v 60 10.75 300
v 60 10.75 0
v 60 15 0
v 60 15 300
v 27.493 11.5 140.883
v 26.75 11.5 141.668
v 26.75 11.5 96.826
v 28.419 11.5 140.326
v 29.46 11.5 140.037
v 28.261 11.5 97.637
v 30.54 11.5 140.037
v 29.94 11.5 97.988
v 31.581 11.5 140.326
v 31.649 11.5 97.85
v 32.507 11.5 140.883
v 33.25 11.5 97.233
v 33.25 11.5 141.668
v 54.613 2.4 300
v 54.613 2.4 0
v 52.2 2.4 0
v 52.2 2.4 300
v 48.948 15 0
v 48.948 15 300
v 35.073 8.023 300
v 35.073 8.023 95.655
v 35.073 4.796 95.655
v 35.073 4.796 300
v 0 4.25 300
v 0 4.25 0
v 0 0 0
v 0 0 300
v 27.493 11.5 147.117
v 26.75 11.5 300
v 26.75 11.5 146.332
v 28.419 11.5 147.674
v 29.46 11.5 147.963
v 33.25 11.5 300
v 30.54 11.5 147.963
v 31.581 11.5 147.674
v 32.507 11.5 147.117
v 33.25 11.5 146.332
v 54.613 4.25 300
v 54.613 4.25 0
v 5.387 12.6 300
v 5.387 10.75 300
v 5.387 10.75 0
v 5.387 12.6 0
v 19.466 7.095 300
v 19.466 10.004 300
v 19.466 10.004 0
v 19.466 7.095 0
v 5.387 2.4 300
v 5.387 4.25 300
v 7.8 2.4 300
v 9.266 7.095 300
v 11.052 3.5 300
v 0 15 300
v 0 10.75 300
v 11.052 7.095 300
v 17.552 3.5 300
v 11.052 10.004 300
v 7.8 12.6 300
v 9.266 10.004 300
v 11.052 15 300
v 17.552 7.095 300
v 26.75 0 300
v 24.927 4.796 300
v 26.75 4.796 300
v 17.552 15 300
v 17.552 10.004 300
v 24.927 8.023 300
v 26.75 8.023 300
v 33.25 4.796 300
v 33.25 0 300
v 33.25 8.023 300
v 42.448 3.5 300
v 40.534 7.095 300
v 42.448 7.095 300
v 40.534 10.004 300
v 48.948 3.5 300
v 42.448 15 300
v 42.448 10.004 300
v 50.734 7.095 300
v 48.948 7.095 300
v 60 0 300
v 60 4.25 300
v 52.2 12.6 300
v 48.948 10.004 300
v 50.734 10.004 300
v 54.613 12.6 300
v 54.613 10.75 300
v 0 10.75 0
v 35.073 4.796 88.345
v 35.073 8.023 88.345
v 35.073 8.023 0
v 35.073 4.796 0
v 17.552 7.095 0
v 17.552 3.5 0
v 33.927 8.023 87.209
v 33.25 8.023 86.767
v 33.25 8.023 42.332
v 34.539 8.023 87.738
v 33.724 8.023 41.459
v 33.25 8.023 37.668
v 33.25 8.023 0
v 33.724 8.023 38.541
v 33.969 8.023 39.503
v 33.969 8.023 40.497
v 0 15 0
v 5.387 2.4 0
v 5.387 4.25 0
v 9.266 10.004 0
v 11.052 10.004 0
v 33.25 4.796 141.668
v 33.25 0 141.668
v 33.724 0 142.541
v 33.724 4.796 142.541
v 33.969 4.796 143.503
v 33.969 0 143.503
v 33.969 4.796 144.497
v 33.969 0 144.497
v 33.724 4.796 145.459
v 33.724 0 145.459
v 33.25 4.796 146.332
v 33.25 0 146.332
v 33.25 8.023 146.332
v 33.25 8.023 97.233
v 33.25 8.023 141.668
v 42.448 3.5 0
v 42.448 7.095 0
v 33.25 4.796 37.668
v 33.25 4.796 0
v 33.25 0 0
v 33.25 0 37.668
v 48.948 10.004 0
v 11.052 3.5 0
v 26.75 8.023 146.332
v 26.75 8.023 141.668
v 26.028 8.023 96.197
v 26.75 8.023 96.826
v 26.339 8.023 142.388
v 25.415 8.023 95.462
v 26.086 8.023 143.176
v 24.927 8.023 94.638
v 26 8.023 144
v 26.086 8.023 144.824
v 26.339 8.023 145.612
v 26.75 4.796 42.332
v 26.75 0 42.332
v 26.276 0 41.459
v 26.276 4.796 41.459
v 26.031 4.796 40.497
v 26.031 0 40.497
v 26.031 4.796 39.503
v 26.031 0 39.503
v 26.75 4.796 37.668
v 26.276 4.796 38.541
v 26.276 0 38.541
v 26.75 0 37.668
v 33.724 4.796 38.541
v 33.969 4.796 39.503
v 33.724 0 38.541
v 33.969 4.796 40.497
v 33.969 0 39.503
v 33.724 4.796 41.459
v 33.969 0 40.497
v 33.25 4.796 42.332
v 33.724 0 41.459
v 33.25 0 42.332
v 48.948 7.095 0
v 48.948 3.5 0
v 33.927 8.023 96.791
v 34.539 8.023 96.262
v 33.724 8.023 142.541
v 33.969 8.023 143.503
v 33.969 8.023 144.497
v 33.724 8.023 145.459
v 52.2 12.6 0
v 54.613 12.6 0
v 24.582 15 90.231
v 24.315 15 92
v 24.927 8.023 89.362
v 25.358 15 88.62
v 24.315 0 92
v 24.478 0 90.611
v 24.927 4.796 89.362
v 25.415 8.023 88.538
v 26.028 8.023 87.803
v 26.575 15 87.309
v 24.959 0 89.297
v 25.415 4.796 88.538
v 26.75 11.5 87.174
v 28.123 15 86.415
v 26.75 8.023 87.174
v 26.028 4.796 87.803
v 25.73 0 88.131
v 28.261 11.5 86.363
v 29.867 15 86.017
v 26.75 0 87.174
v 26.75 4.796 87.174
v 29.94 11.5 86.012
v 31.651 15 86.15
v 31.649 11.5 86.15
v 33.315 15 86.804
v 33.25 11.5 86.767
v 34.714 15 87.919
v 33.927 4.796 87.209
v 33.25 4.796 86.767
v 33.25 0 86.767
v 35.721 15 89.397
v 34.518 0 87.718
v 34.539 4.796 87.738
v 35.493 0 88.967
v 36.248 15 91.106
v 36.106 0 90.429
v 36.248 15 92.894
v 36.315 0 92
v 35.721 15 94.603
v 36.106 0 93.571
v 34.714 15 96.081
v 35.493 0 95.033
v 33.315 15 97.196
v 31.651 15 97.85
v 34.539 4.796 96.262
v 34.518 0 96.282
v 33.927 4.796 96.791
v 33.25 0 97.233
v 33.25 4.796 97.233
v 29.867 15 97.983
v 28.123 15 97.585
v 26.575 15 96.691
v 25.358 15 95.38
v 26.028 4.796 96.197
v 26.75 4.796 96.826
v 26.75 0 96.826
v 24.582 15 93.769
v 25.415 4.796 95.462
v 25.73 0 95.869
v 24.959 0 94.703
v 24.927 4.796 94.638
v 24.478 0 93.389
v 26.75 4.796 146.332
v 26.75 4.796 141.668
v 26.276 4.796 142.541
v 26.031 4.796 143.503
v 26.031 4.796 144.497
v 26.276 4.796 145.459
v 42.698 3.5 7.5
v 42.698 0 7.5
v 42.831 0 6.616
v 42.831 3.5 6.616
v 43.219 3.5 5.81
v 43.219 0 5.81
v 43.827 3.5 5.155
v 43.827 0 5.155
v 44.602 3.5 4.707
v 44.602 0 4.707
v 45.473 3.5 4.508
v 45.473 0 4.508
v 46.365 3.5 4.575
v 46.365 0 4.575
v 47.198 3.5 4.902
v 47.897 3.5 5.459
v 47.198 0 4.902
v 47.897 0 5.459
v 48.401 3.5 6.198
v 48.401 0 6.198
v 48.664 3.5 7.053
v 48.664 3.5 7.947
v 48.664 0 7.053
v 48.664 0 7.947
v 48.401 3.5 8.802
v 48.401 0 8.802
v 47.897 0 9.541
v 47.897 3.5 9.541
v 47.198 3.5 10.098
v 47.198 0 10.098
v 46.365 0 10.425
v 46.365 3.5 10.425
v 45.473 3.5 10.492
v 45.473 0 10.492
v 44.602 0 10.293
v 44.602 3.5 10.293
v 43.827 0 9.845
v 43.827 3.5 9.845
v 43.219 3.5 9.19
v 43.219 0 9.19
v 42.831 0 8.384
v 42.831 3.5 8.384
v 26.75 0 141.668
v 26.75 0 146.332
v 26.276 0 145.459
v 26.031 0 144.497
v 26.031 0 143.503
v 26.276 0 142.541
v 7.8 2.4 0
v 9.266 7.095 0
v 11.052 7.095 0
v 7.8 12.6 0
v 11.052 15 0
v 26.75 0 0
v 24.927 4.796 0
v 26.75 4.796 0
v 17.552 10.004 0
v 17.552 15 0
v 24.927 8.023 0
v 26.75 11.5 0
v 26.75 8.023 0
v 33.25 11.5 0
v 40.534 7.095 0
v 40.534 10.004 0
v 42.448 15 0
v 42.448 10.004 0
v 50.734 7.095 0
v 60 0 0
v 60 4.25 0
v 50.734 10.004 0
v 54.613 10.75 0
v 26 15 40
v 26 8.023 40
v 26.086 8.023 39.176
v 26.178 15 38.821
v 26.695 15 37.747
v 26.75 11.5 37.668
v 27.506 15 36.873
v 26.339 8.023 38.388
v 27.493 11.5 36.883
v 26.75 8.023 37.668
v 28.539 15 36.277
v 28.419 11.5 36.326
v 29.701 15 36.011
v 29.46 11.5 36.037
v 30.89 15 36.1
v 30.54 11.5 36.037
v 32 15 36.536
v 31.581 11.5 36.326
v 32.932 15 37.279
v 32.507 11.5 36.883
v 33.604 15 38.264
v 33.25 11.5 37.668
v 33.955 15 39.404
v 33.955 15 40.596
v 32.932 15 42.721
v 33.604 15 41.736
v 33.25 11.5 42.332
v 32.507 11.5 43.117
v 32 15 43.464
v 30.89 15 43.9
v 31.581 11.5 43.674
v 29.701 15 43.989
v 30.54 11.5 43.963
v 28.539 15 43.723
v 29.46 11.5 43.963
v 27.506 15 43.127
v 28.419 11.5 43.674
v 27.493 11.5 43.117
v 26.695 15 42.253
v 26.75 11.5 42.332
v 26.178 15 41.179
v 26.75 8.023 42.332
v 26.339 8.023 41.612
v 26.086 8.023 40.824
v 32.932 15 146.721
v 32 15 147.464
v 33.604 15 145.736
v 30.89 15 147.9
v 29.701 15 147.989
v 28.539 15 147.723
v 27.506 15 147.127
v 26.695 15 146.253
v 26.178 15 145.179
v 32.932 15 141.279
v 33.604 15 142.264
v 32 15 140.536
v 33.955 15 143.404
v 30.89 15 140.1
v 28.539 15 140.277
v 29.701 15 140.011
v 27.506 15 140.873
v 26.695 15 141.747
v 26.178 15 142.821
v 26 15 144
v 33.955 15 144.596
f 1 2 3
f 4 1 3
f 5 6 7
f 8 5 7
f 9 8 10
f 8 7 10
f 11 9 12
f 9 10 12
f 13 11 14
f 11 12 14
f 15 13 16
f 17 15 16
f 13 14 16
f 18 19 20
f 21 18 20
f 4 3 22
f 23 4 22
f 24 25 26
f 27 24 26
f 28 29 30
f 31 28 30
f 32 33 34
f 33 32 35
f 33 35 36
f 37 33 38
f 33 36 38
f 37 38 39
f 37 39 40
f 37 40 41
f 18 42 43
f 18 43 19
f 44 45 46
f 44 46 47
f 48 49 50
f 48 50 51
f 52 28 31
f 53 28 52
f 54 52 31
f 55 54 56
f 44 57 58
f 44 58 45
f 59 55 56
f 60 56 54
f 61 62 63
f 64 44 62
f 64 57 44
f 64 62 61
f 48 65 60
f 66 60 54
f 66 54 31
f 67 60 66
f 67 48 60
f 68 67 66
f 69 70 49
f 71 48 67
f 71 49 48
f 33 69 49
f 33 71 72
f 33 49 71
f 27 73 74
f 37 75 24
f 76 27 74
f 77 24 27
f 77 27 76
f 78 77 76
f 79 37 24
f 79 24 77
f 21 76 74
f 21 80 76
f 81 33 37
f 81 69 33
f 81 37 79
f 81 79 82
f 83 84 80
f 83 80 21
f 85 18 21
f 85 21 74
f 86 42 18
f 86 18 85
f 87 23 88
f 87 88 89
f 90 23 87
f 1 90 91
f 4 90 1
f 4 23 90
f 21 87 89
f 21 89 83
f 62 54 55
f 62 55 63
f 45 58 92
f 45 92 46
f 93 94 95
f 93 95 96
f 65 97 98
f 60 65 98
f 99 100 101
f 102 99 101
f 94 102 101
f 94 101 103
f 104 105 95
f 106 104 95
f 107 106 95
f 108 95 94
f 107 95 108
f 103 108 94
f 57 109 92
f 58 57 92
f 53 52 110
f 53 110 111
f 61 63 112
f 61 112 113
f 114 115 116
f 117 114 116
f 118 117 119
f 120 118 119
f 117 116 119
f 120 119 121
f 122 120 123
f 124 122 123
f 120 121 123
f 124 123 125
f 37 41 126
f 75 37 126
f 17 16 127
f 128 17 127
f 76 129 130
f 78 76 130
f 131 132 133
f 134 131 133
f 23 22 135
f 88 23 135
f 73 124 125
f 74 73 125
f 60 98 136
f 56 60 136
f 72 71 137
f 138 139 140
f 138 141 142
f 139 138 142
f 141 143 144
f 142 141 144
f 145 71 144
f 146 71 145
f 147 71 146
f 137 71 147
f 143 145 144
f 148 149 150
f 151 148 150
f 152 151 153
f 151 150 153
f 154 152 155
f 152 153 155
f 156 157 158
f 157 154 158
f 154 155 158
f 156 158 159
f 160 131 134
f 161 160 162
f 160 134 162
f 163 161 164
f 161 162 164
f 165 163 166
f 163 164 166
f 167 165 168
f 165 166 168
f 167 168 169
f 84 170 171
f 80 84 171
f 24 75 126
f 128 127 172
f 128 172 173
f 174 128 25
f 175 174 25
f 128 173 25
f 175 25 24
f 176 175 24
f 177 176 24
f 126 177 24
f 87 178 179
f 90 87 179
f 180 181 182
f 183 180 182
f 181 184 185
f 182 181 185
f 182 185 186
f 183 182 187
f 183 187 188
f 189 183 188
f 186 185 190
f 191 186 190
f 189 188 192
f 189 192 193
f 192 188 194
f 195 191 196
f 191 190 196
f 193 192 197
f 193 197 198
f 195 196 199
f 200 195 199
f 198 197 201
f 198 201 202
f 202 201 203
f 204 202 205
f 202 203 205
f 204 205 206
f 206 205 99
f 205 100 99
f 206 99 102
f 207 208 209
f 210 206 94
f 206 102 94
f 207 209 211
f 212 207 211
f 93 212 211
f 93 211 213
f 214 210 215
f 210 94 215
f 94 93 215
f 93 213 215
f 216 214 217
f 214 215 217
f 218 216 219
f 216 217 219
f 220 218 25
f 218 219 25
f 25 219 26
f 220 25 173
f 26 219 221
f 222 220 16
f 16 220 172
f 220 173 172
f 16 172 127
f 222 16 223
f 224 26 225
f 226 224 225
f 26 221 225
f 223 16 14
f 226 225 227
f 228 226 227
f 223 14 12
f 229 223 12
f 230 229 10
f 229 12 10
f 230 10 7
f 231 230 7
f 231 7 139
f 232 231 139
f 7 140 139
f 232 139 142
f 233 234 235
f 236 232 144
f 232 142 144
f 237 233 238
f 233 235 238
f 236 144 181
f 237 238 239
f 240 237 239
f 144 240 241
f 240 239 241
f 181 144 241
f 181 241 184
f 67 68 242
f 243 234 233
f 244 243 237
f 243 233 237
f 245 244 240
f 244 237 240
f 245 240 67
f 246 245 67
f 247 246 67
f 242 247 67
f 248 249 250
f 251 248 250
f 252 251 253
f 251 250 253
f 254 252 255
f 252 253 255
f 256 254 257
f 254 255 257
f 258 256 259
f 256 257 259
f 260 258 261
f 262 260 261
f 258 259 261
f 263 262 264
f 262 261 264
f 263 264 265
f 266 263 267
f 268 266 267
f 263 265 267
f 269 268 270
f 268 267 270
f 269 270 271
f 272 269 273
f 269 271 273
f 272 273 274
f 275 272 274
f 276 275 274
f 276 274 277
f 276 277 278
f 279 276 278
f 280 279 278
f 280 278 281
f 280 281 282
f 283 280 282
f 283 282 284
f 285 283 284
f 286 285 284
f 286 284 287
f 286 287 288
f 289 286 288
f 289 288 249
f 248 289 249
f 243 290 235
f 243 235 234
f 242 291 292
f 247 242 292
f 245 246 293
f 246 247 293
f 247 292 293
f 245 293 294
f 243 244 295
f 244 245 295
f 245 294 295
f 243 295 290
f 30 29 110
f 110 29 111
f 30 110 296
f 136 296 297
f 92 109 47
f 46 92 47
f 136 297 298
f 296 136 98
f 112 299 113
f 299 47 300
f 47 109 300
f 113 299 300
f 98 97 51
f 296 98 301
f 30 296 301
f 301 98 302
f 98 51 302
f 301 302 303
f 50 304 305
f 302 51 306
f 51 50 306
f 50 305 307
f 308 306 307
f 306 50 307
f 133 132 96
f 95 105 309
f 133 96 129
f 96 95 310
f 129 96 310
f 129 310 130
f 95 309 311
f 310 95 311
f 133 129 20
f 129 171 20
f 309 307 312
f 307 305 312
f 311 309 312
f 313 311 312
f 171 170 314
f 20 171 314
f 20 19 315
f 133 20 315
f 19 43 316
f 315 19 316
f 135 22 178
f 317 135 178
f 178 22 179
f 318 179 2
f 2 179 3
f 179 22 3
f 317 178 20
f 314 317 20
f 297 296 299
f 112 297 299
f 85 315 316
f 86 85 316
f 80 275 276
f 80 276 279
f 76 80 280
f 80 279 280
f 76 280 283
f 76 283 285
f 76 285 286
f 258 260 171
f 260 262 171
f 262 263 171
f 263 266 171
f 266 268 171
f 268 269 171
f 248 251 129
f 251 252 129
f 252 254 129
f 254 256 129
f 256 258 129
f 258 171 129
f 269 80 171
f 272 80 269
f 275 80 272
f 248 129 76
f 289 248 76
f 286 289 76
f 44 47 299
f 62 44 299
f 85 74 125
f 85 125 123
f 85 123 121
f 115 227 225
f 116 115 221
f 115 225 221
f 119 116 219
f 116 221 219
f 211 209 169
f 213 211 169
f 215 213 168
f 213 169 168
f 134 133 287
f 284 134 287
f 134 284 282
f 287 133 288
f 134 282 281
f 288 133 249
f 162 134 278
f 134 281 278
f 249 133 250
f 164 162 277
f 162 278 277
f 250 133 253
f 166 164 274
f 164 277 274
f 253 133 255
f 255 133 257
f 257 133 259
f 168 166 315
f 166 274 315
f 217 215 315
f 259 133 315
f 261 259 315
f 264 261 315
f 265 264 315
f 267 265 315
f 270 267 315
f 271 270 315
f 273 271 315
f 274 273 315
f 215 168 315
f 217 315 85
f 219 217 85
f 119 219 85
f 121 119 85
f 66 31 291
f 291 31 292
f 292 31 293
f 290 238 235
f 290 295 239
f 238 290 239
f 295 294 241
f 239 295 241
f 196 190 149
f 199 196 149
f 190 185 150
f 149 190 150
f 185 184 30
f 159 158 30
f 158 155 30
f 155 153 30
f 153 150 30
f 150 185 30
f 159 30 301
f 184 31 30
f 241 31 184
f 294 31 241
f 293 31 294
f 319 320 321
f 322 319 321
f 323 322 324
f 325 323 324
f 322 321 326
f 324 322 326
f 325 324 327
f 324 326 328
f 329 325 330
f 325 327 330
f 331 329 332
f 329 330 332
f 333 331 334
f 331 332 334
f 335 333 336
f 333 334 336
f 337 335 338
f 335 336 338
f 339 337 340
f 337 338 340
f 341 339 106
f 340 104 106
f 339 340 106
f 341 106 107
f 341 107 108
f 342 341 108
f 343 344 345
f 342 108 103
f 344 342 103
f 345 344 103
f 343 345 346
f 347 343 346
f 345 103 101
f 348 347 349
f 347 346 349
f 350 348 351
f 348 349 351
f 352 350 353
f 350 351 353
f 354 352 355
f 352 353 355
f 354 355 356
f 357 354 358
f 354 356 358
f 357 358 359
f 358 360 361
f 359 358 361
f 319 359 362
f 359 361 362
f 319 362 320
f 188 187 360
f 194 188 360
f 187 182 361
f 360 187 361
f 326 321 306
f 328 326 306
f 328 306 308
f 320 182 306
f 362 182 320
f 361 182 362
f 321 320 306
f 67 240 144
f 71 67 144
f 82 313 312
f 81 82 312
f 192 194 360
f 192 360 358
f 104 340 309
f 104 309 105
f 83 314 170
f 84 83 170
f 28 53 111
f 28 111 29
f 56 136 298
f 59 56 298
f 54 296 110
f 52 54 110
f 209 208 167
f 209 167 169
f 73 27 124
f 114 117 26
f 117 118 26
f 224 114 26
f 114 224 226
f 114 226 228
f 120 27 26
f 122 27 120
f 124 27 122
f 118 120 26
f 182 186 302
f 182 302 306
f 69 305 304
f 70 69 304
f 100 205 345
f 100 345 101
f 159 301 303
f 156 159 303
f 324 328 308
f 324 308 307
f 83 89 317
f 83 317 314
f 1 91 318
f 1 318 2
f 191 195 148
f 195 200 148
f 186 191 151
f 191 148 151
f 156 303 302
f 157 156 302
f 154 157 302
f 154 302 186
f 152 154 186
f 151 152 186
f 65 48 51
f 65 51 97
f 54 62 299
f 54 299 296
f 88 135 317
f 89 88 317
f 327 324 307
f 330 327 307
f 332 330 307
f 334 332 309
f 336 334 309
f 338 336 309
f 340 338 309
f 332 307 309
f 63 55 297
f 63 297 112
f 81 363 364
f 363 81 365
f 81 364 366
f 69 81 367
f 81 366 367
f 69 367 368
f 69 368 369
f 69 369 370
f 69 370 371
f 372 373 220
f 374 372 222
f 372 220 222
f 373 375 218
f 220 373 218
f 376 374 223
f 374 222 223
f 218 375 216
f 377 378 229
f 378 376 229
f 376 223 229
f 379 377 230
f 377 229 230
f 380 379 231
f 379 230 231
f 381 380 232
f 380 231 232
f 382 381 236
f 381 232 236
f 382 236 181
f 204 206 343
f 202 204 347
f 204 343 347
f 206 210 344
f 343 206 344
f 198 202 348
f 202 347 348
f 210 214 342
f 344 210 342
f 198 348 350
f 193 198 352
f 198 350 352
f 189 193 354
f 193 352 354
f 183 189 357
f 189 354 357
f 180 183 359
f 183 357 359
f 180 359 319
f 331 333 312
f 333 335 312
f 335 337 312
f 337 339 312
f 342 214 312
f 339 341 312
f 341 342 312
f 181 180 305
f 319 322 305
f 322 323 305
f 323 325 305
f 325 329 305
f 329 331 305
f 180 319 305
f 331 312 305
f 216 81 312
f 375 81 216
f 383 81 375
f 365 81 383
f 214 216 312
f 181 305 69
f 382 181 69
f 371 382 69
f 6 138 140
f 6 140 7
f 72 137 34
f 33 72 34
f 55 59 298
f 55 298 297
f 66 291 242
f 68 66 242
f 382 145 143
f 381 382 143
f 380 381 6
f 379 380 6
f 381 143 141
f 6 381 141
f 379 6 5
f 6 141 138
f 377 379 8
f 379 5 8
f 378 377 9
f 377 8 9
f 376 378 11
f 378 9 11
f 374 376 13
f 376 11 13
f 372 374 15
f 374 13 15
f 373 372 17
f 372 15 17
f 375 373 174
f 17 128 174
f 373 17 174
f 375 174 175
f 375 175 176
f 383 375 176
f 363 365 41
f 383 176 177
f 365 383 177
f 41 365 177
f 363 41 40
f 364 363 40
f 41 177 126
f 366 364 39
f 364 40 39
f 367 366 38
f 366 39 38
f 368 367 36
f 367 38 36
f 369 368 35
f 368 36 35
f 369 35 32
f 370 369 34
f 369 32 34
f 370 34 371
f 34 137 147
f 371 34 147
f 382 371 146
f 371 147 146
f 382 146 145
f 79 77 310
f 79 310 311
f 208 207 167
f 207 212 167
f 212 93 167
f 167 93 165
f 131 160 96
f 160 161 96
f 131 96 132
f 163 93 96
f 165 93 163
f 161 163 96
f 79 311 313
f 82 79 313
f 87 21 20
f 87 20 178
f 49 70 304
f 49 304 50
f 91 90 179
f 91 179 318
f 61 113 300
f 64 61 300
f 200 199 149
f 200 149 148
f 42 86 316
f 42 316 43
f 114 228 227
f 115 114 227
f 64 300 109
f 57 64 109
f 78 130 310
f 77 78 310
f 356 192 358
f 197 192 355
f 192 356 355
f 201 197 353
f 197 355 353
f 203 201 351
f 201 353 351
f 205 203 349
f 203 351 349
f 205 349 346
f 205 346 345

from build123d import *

# Parameters (mm, degrees)
EXTRUDE_1_DEPTH         = 300
HOLE_WIZARD_12_0_12_1_D = 12
HOLE_WIZARD_8_0_8_1_D   = 8
HOLE_WIZARD_6_0_6_1_D   = 6


with BuildPart() as part:
    # 草图1 → 凸台-拉伸1 (new body)
    with BuildSketch(Plane.XY):
        Polygon((0, 0), (26.75, 0), (26.75, 4.796419132), (24.926505169, 4.796419132), (24.926505169, 8.023402897), (26.75, 8.023402897), (26.75, 11.5), (30, 11.5), (33.25, 11.5), (33.25, 8.023402897), (35.073494831, 8.023402897), (35.073494831, 4.796419132), (33.25, 4.796419132), (33.25, 0), (60, 0), (60, 4.25), (54.613325713, 4.25), (54.613325713, 2.4), (52.2, 2.4), (52.2, 12.6), (54.613325713, 12.6), (54.613325713, 10.75), (60, 10.75), (60, 15), (48.947608979, 15), (48.947608979, 10.003848618), (50.733802833, 10.003848618), (50.733802833, 7.094693738), (48.947608979, 7.094693738), (48.947608979, 3.5), (42.447608979, 3.5), (42.447608979, 7.094693738), (40.533802833, 7.094693738), (40.533802833, 10.003848618), (42.447608979, 10.003848618), (42.447608979, 15), (30, 15), (17.552391021, 15), (17.552391021, 10.003848618), (19.466197167, 10.003848618), (19.466197167, 7.094693738), (17.552391021, 7.094693738), (17.552391021, 3.5), (11.052391021, 3.5), (11.052391021, 7.094693738), (9.266197167, 7.094693738), (9.266197167, 10.003848618), (11.052391021, 10.003848618), (11.052391021, 15), (0, 15), (0, 10.75), (5.386674287, 10.75), (5.386674287, 12.6), (7.8, 12.6), (7.8, 2.4), (5.386674287, 2.4), (5.386674287, 4.25), (0, 4.25), align=None)
    extrude(amount=EXTRUDE_1_DEPTH)

    # Ø12.0 (12) 直径孔1 (through all)
    with Locations(Plane(origin=(0, 15, 0), x_dir=(1, 0, 0), z_dir=(0, 1, 0))):
        with Locations((30.31545922, -92)):
            Hole(HOLE_WIZARD_12_0_12_1_D / 2)

    # Ø8.0 (8) 直径孔1 (through all)
    with Locations(Plane(origin=(0, 15, 0), x_dir=(1, 0, 0), z_dir=(0, 1, 0))):
        with Locations((30, -40), (30, -144)):
            Hole(HOLE_WIZARD_8_0_8_1_D / 2)

    # Ø6.0 (6) 直径孔1 (through all)
    with Locations(Plane(origin=(0, 3.5, 0), x_dir=(1, 0, 0), z_dir=(0, 1, 0))):
        with Locations((45.697608979, -7.5)):
            Hole(HOLE_WIZARD_6_0_6_1_D / 2)


solid = part.part
